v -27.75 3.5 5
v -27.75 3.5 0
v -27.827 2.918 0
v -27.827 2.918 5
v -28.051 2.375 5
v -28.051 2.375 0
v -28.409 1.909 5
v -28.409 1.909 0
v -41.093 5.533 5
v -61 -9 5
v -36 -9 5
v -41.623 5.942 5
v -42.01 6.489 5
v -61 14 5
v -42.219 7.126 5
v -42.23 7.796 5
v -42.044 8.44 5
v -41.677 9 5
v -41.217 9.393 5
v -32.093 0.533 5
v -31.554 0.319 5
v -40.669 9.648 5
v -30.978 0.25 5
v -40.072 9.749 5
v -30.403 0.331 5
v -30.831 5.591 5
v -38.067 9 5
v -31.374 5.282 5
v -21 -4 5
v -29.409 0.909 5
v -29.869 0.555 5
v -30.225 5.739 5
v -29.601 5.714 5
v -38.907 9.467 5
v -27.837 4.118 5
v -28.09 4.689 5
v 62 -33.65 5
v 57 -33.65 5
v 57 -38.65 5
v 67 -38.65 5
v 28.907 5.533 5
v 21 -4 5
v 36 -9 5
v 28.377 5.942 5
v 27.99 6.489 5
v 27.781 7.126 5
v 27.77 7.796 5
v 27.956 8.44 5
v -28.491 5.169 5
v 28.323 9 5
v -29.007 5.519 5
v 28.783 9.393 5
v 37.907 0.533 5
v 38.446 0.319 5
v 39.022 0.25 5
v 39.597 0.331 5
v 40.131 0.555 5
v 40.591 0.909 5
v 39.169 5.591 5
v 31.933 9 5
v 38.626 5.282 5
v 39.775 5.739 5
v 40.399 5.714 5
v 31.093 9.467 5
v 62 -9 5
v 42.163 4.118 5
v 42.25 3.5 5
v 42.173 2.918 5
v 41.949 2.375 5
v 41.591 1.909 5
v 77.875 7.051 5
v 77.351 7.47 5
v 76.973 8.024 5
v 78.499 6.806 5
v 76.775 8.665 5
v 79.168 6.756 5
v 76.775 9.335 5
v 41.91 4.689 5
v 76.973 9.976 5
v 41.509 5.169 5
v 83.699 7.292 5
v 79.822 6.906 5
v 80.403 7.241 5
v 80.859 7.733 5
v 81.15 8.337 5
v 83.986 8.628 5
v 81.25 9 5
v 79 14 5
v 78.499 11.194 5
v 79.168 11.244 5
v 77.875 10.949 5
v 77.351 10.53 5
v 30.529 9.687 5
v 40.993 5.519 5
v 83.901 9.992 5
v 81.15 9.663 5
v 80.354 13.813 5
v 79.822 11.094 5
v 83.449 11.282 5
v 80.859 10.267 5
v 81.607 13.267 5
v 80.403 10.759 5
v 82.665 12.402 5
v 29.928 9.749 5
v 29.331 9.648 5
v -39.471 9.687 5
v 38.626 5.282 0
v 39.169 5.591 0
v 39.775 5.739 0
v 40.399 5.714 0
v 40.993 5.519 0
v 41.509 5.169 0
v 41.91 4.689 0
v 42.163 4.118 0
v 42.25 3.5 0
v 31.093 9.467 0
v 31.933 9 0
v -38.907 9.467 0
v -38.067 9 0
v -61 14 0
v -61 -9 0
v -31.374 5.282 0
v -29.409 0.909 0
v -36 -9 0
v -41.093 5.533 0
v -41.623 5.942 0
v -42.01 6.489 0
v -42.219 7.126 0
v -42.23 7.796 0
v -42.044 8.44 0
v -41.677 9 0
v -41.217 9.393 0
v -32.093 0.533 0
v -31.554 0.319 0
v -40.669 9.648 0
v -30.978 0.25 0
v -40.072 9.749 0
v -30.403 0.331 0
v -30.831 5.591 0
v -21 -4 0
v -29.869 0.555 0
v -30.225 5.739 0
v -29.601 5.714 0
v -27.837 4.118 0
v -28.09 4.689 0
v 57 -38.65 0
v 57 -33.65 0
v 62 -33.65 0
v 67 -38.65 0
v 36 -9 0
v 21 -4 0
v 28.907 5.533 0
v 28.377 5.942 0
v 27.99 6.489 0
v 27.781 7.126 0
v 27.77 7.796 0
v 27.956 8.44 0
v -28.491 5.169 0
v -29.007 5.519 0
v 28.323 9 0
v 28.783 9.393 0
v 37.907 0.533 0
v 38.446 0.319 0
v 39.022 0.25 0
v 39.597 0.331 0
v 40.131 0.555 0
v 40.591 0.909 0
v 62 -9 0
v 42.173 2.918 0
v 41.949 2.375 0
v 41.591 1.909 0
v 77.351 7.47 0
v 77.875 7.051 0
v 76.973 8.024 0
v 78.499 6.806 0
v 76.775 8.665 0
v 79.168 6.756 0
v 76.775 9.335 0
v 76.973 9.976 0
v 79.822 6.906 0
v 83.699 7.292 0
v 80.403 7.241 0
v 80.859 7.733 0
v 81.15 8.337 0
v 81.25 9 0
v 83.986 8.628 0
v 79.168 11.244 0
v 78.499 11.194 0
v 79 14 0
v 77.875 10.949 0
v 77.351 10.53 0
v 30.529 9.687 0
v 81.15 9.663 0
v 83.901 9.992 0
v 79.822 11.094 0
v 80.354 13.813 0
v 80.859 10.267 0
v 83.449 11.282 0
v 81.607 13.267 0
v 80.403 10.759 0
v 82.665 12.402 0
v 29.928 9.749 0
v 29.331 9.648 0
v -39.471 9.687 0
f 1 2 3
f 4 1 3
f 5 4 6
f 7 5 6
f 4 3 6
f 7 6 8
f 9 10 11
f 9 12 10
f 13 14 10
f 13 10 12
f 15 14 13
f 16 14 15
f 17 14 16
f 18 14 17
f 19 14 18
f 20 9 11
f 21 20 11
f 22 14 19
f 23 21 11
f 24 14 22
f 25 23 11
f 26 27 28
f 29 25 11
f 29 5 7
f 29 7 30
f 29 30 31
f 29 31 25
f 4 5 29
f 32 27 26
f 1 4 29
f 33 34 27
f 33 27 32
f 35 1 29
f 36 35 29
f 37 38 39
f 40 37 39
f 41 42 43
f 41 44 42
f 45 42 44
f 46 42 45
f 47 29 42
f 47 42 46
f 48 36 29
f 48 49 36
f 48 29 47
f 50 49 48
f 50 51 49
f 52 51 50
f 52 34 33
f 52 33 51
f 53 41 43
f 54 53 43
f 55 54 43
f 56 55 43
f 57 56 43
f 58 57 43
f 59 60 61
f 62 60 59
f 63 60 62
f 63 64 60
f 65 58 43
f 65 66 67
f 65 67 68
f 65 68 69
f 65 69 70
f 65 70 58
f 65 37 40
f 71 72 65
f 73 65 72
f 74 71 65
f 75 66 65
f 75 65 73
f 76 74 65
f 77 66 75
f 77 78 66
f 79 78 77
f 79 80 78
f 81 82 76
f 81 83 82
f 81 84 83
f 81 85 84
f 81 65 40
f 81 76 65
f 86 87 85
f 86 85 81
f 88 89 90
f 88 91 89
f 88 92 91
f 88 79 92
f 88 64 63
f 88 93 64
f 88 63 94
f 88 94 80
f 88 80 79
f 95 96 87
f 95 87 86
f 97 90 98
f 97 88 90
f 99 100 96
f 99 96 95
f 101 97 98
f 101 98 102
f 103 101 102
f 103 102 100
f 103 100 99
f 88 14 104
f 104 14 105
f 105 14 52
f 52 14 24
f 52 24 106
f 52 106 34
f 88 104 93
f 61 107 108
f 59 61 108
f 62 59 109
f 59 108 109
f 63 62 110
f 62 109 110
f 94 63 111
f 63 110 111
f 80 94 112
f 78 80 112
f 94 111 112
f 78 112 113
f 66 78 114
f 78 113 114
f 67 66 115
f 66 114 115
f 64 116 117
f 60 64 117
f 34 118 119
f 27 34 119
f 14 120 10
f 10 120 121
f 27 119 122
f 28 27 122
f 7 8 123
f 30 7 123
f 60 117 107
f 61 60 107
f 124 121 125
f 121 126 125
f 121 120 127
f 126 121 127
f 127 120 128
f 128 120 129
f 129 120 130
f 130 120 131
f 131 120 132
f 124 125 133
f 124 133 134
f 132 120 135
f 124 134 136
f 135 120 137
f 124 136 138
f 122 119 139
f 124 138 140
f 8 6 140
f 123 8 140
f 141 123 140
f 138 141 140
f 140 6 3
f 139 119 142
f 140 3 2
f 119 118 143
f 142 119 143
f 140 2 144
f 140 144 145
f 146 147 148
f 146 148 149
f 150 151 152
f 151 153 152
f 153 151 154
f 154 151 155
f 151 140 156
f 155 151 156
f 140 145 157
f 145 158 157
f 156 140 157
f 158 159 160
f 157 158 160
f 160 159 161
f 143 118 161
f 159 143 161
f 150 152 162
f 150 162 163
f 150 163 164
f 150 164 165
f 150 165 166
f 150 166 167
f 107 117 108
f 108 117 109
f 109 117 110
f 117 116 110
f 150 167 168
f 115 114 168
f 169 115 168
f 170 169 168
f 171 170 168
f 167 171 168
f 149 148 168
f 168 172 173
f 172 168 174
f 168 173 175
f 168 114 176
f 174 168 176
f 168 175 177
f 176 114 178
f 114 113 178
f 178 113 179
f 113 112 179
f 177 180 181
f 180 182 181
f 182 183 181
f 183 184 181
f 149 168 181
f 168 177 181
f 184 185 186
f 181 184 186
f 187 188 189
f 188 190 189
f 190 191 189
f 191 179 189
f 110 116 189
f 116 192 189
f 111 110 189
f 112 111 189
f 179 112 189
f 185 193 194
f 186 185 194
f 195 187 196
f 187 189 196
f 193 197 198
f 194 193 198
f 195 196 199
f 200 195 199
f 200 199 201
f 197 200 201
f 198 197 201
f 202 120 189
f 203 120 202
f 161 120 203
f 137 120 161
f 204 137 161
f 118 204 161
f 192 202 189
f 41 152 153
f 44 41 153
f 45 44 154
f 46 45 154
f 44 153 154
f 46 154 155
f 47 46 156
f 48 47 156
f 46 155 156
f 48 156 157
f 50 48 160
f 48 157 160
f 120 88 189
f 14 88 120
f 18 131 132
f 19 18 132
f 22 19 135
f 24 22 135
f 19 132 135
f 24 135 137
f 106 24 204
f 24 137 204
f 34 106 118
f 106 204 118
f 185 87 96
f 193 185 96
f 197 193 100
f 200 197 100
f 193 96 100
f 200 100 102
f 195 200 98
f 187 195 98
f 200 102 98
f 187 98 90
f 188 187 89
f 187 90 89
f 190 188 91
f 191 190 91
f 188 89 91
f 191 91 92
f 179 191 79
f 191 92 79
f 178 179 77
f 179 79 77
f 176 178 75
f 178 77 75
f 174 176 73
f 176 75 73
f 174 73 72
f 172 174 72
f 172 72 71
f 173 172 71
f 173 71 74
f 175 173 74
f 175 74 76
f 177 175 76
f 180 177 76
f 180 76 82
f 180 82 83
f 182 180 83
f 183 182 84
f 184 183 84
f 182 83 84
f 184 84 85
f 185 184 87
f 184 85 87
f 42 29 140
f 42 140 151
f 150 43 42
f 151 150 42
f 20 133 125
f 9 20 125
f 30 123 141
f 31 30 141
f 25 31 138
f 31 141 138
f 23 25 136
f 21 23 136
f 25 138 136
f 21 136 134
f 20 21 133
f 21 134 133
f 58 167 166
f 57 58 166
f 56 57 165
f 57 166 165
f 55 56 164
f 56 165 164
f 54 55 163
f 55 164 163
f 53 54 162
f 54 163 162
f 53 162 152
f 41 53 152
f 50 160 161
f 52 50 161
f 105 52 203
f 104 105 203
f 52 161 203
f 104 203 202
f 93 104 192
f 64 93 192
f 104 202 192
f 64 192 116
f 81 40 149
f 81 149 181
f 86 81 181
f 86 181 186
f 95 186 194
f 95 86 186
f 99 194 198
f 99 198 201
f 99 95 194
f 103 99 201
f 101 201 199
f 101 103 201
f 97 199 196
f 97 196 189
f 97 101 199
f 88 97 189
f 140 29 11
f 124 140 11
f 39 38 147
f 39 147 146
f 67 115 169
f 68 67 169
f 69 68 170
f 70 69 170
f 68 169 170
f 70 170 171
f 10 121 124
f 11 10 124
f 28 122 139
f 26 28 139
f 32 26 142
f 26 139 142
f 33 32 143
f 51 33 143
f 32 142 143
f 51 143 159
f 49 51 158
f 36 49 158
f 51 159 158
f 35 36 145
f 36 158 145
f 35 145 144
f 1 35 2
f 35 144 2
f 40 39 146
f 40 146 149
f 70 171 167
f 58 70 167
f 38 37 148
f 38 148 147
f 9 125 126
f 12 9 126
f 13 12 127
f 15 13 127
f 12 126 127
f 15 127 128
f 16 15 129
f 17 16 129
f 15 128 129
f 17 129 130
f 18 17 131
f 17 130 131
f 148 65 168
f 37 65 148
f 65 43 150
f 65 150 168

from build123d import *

# Parameters (mm, degrees)
SKETCH1_W           = 16
SKETCH1_H           = 5
BOSS_EXTRUDE1_DEPTH = 5
SKETCH2_W           = 42
SKETCH2_H           = 5
CUT_EXTRUDE1_DEPTH  = 5
SKETCH3_R           = 5
SKETCH3_R_2         = 2.25
BOSS_EXTRUDE2_DEPTH = 5


with BuildPart() as part:
    # Sketch1 → Boss-Extrude1 (new body)
    with BuildSketch(Plane.XY):
        with BuildLine():
            Line((-41.677050983, 9), (-45, 9))
            Line((-45, 9), (-61, 9))
            Line((-61, 9), (-61, -9))
            Line((-61, -9), (61, -9))
            Line((61, -9), (61, 9))
            Line((61, 9), (45, 9))
            Line((45, 9), (31.933033563, 9))
            Line((31.933033563, 9), (38.62595316, 5.281711335))
            ThreePointArc((38.62595316, 5.281711335), (40.992696986, 5.519171289), (42.25, 3.5))
            ThreePointArc((42.25, 3.5), (42.078728948, 2.638962277), (41.590990258, 1.909009742))
            Line((41.590990258, 1.909009742), (40.590990258, 0.909009742))
            ThreePointArc((40.590990258, 0.909009742), (39.312077727, 0.271747884), (37.907303405, 0.533146129))
            Line((37.907303405, 0.533146129), (28.907303405, 5.533146129))
            ThreePointArc((28.907303405, 5.533146129), (27.781296696, 7.126027211), (28.322949017, 9))
            Line((28.322949017, 9), (-38.066966437, 9))
            Line((-38.066966437, 9), (-31.37404684, 5.281711335))
            ThreePointArc((-31.37404684, 5.281711335), (-29.007303014, 5.519171289), (-27.75, 3.5))
            ThreePointArc((-27.75, 3.5), (-27.921271052, 2.638962277), (-28.409009742, 1.909009742))
            Line((-28.409009742, 1.909009742), (-29.409009742, 0.909009742))
            ThreePointArc((-29.409009742, 0.909009742), (-30.687922273, 0.271747884), (-32.092696595, 0.533146129))
            Line((-32.092696595, 0.533146129), (-41.092696595, 5.533146129))
            ThreePointArc((-41.092696595, 5.533146129), (-42.218703304, 7.126027211), (-41.677050983, 9))
        make_face()
        with BuildLine():
            Line((45, 14), (-45, 14))
            Line((-45, 14), (-45, 9))
            Line((-45, 9), (-41.677050983, 9))
            ThreePointArc((-41.677050983, 9), (-40.373972789, 9.718703304), (-38.907303405, 9.466853871))
            Line((-38.907303405, 9.466853871), (-38.066966437, 9))
            Line((-38.066966437, 9), (28.322949017, 9))
            ThreePointArc((28.322949017, 9), (29.626027211, 9.718703304), (31.092696595, 9.466853871))
            Line((31.092696595, 9.466853871), (31.933033563, 9))
            Line((31.933033563, 9), (45, 9))
            Line((45, 9), (45, 14))
        make_face()
        with Locations((-53, 11.5)):
            Rectangle(SKETCH1_W, SKETCH1_H)
        with Locations((53, 11.5)):
            Rectangle(SKETCH1_W, SKETCH1_H)
    extrude(amount=BOSS_EXTRUDE1_DEPTH)

    # Sketch2 → Cut-Extrude1 (cut)
    with BuildSketch(Plane.XY.offset(5)):
        Polygon((-36, -9), (-21, -9), (-21, -4), align=None)
        with Locations((0, -6.5)):
            Rectangle(SKETCH2_W, SKETCH2_H)
        Polygon((21, -4), (21, -9), (36, -9), align=None)
    extrude(amount=-CUT_EXTRUDE1_DEPTH, mode=Mode.SUBTRACT)

    # Sketch3 → Boss-Extrude2 (add)
    # profile 1 of 2: a face of its own
    with BuildSketch(Plane.XY.offset(5)):
        with Locations((79, 9)):
            Circle(SKETCH3_R)
        with Locations((79, 9)):
            Circle(SKETCH3_R_2, mode=Mode.SUBTRACT)
    # profile 2 of 2: a face of its own
    with BuildSketch(Plane.XY.offset(5)):
        with BuildLine():
            Line((79, 14), (61, 14))
            Line((61, 14), (61, -9))
            Line((61, -9), (62, -9))
            Line((62, -9), (62, -33.65))
            Line((62, -33.65), (57, -33.65))
            Line((57, -33.65), (57, -38.65))
            Line((57, -38.65), (67, -38.65))
            Line((67, -38.65), (83.699195541, 7.29191298))
            ThreePointArc((83.699195541, 7.29191298), (74.904854392, 6.131240259), (79, 14))
        make_face()
    extrude(amount=-BOSS_EXTRUDE2_DEPTH)


solid = part.part
